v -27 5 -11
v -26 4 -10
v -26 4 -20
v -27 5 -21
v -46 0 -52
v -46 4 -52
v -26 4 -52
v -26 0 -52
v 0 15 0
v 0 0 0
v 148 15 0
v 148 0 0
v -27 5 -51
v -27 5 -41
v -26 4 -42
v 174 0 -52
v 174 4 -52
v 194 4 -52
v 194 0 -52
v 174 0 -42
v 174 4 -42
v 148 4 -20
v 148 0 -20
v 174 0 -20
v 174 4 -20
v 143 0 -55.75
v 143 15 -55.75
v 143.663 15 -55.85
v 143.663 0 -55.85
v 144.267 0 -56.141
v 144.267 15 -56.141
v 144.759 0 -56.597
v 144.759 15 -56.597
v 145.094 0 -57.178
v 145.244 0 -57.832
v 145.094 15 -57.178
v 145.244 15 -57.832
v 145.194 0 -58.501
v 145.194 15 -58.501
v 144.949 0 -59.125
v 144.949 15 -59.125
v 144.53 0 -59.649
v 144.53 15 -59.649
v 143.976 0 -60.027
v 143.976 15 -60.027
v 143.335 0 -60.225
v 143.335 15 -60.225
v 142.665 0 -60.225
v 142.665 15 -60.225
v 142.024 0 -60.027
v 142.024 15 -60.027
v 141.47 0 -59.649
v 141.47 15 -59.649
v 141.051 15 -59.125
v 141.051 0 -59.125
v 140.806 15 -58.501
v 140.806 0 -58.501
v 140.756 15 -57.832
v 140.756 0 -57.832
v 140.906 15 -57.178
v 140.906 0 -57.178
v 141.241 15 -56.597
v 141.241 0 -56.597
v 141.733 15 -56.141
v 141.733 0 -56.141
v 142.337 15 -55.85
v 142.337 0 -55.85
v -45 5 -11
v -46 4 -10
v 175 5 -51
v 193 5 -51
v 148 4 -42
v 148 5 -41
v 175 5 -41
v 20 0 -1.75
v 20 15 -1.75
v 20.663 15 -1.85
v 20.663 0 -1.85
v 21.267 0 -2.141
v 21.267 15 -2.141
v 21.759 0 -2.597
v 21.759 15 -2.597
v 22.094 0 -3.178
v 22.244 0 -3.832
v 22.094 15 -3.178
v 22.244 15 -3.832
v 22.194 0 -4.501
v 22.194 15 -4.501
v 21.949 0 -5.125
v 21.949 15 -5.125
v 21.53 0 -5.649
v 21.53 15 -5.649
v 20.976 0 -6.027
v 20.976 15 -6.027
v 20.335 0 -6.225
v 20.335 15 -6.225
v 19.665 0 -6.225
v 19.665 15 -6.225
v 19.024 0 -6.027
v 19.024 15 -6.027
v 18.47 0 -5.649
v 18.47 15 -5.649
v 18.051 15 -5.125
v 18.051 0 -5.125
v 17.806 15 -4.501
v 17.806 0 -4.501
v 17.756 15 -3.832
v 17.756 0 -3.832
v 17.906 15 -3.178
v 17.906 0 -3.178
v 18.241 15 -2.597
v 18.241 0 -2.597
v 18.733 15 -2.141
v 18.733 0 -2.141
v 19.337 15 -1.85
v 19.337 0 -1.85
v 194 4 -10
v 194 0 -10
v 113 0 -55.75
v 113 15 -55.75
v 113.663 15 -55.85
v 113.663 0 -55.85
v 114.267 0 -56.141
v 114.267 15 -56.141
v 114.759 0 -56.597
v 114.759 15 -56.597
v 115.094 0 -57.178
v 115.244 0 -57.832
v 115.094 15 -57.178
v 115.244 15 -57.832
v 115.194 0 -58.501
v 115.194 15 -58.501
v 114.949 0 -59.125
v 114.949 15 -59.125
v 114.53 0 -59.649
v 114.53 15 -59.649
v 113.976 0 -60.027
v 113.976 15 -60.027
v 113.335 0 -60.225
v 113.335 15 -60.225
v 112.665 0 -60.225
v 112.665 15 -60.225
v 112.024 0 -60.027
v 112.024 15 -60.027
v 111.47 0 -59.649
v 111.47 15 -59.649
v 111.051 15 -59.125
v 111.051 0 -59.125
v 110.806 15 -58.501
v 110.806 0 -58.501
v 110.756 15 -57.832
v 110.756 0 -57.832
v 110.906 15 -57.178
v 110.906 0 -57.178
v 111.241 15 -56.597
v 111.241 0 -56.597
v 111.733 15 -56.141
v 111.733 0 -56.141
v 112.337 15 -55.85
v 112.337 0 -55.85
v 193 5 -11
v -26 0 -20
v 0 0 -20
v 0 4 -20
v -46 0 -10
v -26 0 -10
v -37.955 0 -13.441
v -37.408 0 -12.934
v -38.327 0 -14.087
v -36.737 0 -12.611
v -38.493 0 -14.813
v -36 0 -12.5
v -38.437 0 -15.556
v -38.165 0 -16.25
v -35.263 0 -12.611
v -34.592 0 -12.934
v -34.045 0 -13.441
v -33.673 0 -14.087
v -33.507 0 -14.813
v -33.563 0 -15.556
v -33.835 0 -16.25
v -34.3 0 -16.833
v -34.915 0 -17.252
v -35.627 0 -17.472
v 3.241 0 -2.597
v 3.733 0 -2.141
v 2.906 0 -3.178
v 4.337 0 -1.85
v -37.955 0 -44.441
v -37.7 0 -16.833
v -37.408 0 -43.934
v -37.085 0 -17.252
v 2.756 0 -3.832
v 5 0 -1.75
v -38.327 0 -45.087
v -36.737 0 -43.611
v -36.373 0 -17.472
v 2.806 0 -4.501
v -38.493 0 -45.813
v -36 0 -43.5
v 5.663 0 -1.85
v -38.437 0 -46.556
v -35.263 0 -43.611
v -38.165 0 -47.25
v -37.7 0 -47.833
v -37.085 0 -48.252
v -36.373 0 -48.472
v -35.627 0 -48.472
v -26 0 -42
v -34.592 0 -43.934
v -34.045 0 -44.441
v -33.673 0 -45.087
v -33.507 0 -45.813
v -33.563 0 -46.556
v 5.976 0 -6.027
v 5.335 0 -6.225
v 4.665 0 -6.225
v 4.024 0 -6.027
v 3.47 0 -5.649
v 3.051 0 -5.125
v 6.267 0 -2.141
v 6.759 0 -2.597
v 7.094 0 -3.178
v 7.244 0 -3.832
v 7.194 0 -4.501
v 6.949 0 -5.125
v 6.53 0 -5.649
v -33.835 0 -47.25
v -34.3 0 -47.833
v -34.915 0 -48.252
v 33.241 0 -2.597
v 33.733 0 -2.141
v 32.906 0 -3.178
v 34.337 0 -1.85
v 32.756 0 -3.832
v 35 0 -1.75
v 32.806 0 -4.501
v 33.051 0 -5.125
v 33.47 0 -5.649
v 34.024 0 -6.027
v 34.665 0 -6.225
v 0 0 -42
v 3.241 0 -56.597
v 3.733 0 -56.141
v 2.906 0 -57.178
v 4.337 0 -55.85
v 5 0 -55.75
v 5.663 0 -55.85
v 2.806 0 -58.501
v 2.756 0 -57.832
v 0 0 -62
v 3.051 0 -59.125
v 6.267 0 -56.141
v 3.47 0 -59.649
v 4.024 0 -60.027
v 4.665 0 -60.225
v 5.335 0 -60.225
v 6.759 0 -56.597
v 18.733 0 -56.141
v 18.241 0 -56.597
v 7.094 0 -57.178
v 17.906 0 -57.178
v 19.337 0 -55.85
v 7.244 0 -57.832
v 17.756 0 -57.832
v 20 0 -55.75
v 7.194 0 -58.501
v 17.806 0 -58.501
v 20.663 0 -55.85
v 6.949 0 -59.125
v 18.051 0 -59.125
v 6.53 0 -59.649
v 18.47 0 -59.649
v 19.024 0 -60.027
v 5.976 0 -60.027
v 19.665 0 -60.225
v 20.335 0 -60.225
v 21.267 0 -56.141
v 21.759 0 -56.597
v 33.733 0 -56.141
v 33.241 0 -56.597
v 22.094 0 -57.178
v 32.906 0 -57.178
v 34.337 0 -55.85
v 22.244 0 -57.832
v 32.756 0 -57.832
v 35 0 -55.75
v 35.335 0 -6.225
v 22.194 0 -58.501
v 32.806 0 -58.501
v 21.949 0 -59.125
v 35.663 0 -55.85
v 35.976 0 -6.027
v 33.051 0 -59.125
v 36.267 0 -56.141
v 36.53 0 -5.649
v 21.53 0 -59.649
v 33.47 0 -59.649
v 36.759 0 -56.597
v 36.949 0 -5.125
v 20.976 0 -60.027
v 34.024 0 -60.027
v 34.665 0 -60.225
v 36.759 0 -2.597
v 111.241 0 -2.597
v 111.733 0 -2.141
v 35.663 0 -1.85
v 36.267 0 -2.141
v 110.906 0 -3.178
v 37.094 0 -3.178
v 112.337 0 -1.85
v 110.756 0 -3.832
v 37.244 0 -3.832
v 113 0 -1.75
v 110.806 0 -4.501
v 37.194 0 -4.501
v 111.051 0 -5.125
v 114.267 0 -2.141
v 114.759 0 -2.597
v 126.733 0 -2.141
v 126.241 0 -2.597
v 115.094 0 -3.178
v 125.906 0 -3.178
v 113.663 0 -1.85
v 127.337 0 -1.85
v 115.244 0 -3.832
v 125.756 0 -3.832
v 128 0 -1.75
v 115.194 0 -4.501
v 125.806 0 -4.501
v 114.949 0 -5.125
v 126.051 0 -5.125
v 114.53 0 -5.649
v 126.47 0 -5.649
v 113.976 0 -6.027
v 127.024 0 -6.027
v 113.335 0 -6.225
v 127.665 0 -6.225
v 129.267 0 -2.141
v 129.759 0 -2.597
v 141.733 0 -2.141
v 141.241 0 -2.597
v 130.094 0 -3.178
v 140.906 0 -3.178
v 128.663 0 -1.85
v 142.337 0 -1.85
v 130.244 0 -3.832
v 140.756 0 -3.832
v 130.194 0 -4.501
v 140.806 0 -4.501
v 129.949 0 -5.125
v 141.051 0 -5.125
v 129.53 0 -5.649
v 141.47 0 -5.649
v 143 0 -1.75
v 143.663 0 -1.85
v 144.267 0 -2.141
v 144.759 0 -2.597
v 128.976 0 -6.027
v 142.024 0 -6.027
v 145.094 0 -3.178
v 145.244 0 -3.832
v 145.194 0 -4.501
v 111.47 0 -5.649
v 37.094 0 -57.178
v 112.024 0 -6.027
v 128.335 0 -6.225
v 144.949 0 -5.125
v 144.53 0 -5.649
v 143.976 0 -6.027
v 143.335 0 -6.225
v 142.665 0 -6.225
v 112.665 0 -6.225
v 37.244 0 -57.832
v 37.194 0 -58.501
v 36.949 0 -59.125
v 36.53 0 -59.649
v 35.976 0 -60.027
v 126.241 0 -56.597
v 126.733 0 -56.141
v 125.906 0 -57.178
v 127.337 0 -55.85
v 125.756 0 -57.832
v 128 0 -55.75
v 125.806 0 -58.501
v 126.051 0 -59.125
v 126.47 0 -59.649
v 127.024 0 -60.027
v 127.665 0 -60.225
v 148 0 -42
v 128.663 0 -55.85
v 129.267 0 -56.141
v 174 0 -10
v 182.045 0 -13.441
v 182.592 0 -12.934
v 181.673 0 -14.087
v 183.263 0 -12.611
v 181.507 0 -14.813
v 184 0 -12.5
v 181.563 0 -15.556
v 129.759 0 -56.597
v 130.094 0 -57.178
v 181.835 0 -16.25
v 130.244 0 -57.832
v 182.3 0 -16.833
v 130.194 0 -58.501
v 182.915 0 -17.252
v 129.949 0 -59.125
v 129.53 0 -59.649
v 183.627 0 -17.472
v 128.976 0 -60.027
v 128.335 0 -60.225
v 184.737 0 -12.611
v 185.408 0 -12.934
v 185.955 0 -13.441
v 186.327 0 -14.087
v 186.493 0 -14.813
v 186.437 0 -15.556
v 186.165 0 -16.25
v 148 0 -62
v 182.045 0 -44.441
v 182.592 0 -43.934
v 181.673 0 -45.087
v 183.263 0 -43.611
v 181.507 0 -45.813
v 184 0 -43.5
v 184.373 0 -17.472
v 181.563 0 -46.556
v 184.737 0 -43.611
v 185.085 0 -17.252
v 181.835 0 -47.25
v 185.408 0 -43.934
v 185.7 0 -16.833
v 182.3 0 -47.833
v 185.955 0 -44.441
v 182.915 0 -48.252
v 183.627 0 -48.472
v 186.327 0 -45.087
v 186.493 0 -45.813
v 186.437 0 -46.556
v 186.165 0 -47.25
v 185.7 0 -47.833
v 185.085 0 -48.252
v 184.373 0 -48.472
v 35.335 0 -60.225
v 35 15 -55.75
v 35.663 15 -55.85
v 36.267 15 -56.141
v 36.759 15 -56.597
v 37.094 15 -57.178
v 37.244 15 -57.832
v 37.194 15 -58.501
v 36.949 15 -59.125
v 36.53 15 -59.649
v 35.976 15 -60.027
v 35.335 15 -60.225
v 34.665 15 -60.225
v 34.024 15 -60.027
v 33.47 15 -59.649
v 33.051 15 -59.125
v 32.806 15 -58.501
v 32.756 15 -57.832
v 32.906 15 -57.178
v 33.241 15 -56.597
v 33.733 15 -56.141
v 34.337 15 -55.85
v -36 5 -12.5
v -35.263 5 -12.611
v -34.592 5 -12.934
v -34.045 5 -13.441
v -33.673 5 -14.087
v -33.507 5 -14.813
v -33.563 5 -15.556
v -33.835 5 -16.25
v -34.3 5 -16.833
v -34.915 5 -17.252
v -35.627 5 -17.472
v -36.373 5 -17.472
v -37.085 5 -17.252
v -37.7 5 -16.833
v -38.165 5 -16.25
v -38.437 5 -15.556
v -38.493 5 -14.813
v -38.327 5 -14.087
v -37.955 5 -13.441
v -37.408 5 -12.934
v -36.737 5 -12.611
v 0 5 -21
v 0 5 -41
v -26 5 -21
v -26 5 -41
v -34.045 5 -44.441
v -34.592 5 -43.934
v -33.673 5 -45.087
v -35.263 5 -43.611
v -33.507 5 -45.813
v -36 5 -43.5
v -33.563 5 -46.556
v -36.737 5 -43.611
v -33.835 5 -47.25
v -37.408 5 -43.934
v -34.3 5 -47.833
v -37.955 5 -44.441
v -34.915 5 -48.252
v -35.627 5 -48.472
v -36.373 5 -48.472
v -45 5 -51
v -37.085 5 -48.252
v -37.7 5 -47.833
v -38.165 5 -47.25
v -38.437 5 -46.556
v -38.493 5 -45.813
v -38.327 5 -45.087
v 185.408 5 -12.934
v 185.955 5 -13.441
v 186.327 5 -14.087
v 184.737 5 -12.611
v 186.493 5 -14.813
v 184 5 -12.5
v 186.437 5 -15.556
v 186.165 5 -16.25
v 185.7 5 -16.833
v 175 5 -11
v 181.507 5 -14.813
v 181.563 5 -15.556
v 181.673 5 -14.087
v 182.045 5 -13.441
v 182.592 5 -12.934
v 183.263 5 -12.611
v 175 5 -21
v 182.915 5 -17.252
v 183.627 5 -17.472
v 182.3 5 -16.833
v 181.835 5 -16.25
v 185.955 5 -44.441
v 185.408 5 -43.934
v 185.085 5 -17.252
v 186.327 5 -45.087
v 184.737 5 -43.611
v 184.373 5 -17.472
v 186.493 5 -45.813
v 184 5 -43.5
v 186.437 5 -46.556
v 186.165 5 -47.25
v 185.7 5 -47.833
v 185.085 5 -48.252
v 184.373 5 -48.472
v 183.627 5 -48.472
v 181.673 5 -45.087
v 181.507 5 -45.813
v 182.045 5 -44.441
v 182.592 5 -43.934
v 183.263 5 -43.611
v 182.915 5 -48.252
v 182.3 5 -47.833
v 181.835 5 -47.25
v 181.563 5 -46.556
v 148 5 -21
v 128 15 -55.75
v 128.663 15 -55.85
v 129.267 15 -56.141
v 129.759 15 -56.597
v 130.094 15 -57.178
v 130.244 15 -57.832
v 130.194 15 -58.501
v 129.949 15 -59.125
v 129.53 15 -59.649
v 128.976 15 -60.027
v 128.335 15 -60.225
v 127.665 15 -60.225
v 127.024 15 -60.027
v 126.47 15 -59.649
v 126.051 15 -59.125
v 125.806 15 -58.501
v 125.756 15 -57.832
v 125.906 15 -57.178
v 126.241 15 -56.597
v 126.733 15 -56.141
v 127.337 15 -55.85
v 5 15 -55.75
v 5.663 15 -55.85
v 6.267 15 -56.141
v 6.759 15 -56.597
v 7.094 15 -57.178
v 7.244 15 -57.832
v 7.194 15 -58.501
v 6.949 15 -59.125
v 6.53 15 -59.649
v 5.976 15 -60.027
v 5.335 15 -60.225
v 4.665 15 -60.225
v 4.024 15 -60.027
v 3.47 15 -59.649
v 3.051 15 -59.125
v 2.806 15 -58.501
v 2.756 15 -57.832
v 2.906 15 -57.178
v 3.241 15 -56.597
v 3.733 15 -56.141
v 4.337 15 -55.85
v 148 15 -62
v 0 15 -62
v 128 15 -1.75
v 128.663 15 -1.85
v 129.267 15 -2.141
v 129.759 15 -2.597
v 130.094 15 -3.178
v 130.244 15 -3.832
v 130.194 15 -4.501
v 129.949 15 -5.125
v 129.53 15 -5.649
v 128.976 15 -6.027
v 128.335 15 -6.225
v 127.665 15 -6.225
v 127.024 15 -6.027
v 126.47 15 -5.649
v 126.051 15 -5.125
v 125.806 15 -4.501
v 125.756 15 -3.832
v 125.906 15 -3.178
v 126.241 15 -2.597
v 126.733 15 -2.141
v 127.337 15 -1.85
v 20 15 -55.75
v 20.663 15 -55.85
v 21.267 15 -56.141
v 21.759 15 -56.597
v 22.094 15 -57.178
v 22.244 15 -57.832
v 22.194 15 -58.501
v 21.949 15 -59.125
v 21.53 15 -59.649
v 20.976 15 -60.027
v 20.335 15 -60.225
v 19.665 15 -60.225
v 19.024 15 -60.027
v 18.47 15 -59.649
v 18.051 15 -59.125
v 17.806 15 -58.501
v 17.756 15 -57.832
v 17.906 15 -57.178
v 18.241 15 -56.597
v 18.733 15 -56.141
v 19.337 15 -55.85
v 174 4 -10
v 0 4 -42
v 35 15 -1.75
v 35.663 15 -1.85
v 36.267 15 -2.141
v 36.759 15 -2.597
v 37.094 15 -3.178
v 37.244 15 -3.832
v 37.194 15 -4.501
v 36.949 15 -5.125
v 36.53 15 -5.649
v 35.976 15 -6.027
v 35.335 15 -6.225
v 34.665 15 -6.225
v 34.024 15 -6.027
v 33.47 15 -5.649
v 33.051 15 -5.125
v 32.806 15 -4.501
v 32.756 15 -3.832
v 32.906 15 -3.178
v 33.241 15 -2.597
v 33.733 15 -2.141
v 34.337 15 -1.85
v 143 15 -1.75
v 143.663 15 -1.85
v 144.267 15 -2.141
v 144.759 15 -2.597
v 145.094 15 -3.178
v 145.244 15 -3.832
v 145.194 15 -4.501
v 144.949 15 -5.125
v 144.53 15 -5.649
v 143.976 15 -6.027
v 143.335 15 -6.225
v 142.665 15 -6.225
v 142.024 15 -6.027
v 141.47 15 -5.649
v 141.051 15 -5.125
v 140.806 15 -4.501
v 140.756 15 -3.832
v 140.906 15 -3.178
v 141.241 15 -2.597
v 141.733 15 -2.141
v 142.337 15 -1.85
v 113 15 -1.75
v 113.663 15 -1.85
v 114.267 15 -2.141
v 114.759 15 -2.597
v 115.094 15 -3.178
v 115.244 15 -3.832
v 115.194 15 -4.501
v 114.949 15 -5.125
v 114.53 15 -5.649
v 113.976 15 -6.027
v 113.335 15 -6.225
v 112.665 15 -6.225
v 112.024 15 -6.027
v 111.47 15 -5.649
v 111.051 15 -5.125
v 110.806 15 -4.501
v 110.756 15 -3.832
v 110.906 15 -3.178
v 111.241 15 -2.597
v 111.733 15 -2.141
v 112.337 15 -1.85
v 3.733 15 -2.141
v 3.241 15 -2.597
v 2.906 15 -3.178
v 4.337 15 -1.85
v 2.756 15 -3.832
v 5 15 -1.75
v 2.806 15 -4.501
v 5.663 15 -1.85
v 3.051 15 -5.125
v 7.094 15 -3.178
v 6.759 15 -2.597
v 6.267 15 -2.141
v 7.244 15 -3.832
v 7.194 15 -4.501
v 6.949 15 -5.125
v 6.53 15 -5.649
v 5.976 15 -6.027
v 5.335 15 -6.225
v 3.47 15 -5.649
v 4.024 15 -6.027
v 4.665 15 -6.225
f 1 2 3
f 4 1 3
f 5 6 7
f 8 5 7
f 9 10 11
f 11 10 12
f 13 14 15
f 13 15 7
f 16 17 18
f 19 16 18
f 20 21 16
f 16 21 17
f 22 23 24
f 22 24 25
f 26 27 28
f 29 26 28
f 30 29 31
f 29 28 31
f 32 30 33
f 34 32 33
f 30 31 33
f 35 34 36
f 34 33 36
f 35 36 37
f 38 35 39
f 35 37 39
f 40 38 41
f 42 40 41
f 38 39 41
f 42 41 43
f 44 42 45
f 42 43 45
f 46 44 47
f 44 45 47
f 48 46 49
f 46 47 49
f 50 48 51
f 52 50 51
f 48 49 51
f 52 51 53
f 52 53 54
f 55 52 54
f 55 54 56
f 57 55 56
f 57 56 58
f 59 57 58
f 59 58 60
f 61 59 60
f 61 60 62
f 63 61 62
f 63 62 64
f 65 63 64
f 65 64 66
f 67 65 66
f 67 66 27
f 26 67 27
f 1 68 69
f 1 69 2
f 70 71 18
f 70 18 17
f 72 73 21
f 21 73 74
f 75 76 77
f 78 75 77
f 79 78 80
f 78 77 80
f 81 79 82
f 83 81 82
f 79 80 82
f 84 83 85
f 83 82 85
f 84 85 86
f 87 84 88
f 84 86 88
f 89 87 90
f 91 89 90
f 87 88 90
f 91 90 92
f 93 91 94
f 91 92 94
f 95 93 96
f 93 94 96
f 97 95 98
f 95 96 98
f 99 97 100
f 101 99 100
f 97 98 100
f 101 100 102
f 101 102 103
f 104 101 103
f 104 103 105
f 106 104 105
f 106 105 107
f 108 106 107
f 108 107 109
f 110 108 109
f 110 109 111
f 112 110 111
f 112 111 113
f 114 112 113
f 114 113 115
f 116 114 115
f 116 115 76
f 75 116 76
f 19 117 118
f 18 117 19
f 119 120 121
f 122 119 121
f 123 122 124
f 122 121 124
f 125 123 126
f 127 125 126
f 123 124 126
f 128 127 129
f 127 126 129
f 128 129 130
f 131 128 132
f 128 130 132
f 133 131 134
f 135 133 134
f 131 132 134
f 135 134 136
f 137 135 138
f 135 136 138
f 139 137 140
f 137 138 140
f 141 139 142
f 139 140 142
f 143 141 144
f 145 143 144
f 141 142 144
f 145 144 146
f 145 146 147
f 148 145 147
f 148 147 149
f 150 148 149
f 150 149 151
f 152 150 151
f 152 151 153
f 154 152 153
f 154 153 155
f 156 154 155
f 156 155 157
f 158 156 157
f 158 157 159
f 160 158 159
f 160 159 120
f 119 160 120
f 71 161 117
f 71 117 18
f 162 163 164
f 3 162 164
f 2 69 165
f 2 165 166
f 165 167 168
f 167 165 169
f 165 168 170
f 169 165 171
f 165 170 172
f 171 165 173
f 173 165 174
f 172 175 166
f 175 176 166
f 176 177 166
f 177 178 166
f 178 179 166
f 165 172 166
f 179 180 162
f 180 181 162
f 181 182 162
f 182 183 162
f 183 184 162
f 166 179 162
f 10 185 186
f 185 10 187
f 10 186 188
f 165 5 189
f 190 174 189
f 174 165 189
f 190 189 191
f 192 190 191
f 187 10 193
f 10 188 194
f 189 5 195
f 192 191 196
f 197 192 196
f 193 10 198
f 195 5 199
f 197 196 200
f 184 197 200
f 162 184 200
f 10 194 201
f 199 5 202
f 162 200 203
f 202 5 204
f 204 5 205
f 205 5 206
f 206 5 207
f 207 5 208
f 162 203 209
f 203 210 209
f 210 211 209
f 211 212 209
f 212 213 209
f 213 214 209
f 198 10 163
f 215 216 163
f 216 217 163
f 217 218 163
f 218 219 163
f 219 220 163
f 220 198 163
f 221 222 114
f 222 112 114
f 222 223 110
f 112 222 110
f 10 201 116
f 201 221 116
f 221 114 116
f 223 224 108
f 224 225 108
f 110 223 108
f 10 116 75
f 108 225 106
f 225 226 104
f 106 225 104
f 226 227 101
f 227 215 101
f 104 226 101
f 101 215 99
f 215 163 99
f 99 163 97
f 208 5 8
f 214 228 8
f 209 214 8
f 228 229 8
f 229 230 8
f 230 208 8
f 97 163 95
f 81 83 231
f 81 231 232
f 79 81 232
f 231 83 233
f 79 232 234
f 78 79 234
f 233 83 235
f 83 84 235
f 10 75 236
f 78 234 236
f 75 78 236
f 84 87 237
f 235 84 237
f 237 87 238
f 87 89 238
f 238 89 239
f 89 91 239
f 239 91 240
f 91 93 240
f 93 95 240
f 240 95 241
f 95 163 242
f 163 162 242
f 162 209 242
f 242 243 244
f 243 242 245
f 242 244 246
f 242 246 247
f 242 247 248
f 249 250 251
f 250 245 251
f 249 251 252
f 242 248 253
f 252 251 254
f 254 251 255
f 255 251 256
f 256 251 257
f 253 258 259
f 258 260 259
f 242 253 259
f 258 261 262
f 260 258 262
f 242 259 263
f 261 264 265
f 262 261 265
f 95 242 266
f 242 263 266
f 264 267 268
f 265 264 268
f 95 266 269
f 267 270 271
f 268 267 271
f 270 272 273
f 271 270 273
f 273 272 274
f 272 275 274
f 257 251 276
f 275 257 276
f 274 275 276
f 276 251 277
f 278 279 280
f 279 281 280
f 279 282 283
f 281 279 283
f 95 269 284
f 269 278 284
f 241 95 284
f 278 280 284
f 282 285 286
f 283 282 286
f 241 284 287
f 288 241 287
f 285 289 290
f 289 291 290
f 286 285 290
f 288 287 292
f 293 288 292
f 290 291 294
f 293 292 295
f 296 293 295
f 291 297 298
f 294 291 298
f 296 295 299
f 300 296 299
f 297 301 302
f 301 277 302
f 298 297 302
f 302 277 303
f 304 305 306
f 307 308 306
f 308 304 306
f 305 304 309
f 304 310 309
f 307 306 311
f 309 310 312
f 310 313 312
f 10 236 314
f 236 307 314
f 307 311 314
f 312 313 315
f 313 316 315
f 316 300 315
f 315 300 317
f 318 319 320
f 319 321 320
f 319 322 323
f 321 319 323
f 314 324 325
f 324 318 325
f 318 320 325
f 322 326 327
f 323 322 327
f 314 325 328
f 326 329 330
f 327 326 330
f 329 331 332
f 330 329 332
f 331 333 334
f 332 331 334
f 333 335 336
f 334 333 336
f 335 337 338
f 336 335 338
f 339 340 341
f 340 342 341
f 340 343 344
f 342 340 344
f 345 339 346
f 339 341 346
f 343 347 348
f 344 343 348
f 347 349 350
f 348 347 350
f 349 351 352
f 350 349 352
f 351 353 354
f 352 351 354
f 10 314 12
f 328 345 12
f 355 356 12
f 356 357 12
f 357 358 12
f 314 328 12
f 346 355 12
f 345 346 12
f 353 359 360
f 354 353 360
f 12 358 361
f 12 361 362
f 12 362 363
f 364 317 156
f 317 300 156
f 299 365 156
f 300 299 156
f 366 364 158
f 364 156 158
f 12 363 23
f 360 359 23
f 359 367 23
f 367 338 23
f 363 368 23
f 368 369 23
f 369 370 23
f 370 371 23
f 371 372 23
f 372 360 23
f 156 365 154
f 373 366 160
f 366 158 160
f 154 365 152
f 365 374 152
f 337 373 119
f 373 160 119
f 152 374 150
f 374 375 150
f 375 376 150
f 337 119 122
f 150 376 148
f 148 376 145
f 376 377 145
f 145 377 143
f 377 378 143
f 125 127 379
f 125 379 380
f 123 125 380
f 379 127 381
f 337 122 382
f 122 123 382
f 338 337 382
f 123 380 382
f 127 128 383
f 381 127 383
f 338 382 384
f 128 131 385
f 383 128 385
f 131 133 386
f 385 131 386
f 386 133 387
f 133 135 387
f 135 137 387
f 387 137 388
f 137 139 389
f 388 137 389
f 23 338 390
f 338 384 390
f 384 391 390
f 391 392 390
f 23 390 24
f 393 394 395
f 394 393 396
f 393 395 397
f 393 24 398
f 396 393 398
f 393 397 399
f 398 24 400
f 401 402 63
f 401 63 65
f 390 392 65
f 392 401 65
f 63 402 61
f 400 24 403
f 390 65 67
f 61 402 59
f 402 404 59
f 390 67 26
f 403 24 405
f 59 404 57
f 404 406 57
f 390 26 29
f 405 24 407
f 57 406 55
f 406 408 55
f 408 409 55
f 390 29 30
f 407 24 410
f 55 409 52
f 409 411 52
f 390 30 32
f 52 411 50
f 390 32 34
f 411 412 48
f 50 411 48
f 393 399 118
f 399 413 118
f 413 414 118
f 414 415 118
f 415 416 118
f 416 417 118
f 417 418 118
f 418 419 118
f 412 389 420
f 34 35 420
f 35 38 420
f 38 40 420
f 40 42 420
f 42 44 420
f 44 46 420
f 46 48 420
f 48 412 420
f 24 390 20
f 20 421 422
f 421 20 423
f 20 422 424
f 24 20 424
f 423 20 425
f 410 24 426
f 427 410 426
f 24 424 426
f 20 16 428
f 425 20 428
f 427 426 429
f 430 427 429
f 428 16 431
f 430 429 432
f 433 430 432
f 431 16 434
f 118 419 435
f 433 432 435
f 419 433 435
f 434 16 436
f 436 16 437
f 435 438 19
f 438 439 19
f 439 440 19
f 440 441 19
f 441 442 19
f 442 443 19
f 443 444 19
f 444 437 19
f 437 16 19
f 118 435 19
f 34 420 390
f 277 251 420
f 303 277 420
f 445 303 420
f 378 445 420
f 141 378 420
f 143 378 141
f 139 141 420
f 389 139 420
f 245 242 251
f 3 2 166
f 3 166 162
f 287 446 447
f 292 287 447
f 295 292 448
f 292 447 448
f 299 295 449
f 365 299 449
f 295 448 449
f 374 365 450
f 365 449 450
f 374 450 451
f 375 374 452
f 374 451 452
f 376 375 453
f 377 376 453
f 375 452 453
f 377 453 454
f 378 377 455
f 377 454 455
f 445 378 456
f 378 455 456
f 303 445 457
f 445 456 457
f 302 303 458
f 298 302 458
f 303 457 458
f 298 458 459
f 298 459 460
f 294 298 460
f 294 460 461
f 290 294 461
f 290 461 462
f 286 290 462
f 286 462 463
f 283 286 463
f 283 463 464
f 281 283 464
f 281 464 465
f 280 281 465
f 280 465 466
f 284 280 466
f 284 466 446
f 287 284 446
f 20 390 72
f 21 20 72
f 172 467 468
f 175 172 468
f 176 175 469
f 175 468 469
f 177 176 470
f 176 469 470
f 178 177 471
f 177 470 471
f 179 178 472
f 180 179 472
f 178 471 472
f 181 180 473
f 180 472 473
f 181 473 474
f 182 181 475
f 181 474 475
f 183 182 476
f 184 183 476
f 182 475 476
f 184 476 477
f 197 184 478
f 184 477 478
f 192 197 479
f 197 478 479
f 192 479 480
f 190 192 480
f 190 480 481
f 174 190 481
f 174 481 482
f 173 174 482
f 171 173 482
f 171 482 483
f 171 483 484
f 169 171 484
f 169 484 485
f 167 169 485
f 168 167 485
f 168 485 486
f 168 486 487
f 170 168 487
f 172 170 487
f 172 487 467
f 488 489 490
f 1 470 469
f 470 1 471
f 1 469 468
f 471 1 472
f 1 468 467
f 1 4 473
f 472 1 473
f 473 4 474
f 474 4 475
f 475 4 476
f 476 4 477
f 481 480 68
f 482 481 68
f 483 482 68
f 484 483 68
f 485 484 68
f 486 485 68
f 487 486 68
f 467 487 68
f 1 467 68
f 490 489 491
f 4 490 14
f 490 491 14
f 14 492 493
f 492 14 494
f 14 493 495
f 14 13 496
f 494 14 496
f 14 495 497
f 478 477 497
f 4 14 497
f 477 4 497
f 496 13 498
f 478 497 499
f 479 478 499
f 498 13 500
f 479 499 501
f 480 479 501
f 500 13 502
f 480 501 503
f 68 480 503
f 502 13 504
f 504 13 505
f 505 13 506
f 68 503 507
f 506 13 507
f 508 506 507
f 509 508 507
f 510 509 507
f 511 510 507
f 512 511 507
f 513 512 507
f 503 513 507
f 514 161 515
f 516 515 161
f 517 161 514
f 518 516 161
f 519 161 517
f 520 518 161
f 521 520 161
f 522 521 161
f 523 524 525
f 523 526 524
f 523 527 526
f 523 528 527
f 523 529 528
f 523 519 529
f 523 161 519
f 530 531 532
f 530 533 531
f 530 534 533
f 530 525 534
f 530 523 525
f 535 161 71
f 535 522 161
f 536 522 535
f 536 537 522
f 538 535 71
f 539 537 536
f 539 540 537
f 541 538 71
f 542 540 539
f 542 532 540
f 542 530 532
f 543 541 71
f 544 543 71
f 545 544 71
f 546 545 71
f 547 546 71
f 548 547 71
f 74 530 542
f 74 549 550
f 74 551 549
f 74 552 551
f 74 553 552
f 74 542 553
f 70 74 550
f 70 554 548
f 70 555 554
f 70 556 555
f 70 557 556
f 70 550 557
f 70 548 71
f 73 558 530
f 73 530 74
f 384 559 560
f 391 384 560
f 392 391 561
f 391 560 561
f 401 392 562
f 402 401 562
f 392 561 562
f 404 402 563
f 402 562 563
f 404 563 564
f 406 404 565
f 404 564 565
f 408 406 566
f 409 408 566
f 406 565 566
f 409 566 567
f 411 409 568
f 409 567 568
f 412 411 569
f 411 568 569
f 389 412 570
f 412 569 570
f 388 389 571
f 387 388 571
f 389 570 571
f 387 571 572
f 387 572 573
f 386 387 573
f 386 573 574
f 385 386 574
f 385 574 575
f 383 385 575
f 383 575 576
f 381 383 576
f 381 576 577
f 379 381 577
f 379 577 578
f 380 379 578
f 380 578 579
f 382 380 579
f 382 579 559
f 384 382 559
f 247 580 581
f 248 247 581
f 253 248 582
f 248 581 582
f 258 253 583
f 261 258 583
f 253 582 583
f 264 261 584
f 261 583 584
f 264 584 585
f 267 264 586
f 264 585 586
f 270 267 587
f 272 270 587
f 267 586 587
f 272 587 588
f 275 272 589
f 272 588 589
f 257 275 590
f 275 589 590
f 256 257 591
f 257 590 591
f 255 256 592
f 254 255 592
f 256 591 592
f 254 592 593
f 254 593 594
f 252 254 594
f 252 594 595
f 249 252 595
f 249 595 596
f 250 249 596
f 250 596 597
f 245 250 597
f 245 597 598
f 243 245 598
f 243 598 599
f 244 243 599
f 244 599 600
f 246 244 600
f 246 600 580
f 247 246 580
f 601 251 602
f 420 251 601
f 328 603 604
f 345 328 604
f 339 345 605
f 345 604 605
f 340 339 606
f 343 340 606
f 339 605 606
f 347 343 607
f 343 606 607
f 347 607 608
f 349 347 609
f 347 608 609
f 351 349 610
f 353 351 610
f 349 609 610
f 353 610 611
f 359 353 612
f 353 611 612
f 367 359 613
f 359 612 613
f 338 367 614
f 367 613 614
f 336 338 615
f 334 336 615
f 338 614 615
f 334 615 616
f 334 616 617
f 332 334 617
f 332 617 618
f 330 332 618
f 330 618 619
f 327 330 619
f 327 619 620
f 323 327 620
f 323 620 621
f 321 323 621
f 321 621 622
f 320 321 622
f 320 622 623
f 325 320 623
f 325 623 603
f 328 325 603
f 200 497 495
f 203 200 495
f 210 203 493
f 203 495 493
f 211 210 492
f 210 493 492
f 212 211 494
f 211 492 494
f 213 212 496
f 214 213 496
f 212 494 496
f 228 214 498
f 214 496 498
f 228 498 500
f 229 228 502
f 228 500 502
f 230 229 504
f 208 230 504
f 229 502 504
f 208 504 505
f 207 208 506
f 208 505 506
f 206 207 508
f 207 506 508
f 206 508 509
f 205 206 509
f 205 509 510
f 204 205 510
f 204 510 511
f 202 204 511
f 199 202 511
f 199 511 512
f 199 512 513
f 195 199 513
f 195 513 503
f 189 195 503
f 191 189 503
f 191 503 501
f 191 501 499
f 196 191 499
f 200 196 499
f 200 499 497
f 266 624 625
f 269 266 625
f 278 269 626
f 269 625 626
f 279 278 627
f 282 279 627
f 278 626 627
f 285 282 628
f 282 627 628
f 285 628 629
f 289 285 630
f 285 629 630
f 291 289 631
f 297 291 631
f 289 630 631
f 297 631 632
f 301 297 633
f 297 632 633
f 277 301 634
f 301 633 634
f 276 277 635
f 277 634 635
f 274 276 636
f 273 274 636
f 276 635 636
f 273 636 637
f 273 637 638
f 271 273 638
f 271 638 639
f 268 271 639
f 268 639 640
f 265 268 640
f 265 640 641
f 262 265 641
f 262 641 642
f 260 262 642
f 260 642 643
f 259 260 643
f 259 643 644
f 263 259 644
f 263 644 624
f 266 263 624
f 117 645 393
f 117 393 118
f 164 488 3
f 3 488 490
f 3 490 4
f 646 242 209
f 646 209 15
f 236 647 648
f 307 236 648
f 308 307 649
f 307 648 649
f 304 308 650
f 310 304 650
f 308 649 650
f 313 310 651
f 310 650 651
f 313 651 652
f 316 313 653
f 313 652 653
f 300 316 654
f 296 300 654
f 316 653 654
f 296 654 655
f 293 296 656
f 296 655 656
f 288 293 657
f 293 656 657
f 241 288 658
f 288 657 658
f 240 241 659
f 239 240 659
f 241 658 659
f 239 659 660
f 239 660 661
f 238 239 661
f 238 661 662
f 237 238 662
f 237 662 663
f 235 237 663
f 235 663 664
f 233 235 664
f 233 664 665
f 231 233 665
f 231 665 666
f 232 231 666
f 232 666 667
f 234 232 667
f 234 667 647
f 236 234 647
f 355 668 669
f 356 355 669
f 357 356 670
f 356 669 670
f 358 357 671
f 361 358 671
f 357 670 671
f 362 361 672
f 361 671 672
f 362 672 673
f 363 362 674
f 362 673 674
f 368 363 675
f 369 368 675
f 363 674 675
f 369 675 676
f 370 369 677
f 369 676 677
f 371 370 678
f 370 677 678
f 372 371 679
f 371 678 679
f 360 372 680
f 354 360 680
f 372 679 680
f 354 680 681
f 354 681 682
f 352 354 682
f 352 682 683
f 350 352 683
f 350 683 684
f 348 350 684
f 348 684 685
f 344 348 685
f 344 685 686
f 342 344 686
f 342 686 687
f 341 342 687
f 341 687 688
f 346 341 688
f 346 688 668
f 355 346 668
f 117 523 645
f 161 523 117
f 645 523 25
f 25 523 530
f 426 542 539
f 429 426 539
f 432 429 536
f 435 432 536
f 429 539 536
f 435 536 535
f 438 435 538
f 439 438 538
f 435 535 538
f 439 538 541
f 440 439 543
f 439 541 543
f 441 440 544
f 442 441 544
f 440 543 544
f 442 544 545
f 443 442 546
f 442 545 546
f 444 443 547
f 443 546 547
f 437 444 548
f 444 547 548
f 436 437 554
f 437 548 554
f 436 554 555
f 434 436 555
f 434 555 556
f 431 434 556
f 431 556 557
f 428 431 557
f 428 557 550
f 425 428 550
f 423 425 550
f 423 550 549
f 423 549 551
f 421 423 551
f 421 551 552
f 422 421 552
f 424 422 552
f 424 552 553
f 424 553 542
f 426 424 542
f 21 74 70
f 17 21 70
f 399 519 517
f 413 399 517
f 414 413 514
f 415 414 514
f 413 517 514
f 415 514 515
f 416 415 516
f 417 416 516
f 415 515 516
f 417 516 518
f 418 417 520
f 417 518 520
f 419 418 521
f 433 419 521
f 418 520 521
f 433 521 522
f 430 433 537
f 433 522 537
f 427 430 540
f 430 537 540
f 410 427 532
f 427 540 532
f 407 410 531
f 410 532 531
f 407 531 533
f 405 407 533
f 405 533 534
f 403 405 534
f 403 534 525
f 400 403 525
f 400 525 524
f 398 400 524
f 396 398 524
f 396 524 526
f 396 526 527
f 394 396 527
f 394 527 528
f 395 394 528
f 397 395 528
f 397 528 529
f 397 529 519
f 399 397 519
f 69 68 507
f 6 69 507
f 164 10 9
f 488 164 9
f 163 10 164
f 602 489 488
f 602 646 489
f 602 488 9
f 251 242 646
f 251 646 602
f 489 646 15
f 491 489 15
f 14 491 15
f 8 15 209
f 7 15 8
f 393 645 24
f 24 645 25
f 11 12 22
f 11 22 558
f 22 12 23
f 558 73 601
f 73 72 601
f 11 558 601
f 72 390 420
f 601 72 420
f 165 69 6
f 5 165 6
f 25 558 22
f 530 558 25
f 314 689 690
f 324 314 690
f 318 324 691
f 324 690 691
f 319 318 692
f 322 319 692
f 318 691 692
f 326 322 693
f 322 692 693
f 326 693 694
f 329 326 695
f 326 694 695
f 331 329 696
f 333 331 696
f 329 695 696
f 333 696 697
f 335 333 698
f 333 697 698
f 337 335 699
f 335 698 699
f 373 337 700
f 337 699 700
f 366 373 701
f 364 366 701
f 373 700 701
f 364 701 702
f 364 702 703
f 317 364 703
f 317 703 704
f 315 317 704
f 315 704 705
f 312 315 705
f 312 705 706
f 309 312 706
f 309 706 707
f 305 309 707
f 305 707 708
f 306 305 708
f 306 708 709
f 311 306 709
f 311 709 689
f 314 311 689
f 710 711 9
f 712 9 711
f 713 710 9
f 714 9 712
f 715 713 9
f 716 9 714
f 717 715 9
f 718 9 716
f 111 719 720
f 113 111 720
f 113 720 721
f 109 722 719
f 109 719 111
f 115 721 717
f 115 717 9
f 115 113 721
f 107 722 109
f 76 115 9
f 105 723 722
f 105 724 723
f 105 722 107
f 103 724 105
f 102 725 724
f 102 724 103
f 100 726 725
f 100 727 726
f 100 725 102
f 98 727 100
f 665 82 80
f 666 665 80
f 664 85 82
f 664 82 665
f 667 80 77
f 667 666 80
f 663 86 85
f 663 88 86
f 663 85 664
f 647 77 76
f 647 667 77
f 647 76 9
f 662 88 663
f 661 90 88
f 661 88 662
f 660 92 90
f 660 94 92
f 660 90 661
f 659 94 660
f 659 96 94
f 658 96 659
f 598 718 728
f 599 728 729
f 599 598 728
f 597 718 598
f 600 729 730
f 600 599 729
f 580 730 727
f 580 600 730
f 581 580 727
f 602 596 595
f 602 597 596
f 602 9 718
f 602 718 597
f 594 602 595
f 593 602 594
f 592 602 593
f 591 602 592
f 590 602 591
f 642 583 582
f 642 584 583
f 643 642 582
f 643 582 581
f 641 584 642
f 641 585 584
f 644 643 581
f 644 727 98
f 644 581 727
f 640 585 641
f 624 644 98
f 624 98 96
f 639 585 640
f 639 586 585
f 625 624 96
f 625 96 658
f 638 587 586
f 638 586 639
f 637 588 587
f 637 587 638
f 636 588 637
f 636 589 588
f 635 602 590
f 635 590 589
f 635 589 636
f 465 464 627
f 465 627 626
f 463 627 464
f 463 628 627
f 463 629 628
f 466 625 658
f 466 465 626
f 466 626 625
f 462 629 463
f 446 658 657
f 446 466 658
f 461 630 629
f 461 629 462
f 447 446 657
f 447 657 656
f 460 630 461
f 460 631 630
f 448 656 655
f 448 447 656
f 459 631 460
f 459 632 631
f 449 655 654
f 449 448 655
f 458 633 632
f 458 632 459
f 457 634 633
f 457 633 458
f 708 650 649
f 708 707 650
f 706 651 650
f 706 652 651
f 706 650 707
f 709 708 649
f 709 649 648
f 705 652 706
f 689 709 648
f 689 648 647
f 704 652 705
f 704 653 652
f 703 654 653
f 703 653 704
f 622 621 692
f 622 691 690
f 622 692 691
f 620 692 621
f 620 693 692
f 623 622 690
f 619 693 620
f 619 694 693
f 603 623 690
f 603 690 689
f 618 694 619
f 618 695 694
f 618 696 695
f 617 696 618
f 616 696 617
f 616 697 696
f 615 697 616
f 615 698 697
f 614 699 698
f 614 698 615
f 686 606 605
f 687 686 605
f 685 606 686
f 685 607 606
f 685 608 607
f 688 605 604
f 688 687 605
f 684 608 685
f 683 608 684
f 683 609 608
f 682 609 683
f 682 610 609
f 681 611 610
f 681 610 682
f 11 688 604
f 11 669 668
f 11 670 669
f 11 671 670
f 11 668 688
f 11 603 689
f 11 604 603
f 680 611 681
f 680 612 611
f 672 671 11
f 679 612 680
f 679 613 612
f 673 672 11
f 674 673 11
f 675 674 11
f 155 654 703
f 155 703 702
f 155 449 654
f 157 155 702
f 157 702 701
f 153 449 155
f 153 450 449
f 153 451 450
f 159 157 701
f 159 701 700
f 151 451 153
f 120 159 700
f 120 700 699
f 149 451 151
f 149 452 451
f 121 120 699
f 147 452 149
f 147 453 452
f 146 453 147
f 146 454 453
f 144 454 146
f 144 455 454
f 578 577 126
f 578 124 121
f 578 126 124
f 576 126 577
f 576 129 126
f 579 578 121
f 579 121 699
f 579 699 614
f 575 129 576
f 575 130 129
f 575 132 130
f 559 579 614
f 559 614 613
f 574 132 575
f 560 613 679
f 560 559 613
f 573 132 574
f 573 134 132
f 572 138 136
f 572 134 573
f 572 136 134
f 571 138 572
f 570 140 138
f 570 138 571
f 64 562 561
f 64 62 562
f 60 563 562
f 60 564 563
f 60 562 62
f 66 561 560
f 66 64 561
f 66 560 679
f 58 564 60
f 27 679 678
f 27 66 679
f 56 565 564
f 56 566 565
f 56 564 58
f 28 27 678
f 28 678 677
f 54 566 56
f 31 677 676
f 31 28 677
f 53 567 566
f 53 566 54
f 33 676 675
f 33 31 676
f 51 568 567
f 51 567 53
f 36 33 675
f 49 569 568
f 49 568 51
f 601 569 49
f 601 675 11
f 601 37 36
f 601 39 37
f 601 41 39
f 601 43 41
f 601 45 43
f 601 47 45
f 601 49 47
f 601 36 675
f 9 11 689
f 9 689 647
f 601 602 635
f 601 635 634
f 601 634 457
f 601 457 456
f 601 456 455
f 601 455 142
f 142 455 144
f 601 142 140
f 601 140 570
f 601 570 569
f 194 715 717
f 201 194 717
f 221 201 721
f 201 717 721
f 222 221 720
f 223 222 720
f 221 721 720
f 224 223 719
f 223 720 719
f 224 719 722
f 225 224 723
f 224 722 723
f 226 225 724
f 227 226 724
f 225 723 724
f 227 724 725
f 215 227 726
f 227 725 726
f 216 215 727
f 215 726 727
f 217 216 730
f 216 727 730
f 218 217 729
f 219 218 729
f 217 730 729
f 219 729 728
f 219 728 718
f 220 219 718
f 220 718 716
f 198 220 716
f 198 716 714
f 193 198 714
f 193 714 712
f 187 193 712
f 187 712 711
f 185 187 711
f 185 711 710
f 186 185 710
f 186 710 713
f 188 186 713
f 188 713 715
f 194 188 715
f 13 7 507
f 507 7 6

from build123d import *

# Parameters (mm, degrees)
SKETCH1_W           = 148
SKETCH1_H           = 62
BOSS_EXTRUDE1_DEPTH = 15
SKETCH2_R           = 2.25
CUT_EXTRUDE1_DEPTH  = 35
SKETCH3_R           = 2.25
CUT_EXTRUDE2_DEPTH  = 25
SKETCH4_W           = 22
SKETCH4_H           = 5
BOSS_EXTRUDE2_DEPTH = 26
SKETCH5_W           = 22
SKETCH5_H           = 5
BOSS_EXTRUDE3_DEPTH = 26
SKETCH6_W           = 20
SKETCH6_H           = 42
BOSS_EXTRUDE4_DEPTH = 15
SKETCH7_W           = 20
SKETCH7_H           = 42
BOSS_EXTRUDE5_DEPTH = 15
SKETCH8_R           = 2.5
CUT_EXTRUDE3_DEPTH  = 25
SKETCH9_R           = 2.5
CUT_EXTRUDE4_DEPTH  = 25
CHAMFER3_SIZE       = 1
CHAMFER4_SIZE       = 1
CHAMFER5_SIZE       = 1
SKETCH10_W          = 27.530750263
SKETCH10_H          = 14.173658936
CUT_EXTRUDE5_DEPTH  = 60
SKETCH11_W          = 32.495188708
SKETCH11_H          = 15.919959855
CUT_EXTRUDE6_DEPTH  = 60
CHAMFER6_SIZE       = 1
CHAMFER7_SIZE       = 1


with BuildPart() as part:
    # Sketch1 → Boss-Extrude1 (new body)
    with BuildSketch(Plane(origin=(0, 0, 0), x_dir=(1, 0, 0), z_dir=(0, 1, 0))):
        with Locations((74, 31)):
            Rectangle(SKETCH1_W, SKETCH1_H)
    extrude(amount=BOSS_EXTRUDE1_DEPTH)

    # Sketch2 → Cut-Extrude1 (cut)
    with BuildSketch(Plane(origin=(0, 15, 0), x_dir=(1, 0, 0), z_dir=(0, 1, 0))):
        with Locations(Location((5, 4, 0), (0, 0, 270))):
            Circle(SKETCH2_R)
        with Locations(Location((20, 4, 0), (0, 0, 270))):
            Circle(SKETCH2_R)
        with Locations(Location((35, 4, 0), (0, 0, 270))):
            Circle(SKETCH2_R)
        with Locations(Location((5, 58, 0), (0, 0, 270))):
            Circle(SKETCH2_R)
        with Locations(Location((20, 58, 0), (0, 0, 270))):
            Circle(SKETCH2_R)
        with Locations(Location((35, 58, 0), (0, 0, 270))):
            Circle(SKETCH2_R)
    extrude(amount=-CUT_EXTRUDE1_DEPTH, mode=Mode.SUBTRACT)

    # Sketch3 → Cut-Extrude2 (cut)
    with BuildSketch(Plane(origin=(0, 15, 0), x_dir=(1, 0, 0), z_dir=(0, 1, 0))):
        with Locations(Location((143, 58, 0), (0, 0, 270))):
            Circle(SKETCH3_R)
        with Locations(Location((143, 4, 0), (0, 0, 270))):
            Circle(SKETCH3_R)
        with Locations(Location((128, 58, 0), (0, 0, 270))):
            Circle(SKETCH3_R)
        with Locations(Location((113, 58, 0), (0, 0, 270))):
            Circle(SKETCH3_R)
        with Locations(Location((128, 4, 0), (0, 0, 270))):
            Circle(SKETCH3_R)
        with Locations(Location((113, 4, 0), (0, 0, 270))):
            Circle(SKETCH3_R)
    extrude(amount=-CUT_EXTRUDE2_DEPTH, mode=Mode.SUBTRACT)

    # Sketch4 → Boss-Extrude2 (add)
    with BuildSketch(Plane(origin=(148, 0, 0), x_dir=(0, 0, -1), z_dir=(1, 0, 0))):
        with Locations((31, 2.5)):
            Rectangle(SKETCH4_W, SKETCH4_H)
    extrude(amount=BOSS_EXTRUDE2_DEPTH)

    # Sketch5 → Boss-Extrude3 (add)
    with BuildSketch(Plane.ZY):
        with Locations((-31, 2.5)):
            Rectangle(SKETCH5_W, SKETCH5_H)
    extrude(amount=BOSS_EXTRUDE3_DEPTH)

    # Sketch6 → Boss-Extrude4 (add)
    with BuildSketch(Plane(origin=(0, 15, 0), x_dir=(1, 0, 0), z_dir=(0, 1, 0))):
        with Locations((184, 31)):
            Rectangle(SKETCH6_W, SKETCH6_H)
    extrude(amount=-BOSS_EXTRUDE4_DEPTH)

    # Sketch7 → Boss-Extrude5 (add)
    with BuildSketch(Plane(origin=(0, 15, 0), x_dir=(1, 0, 0), z_dir=(0, 1, 0))):
        with Locations((-36, 31)):
            Rectangle(SKETCH7_W, SKETCH7_H)
    extrude(amount=-BOSS_EXTRUDE5_DEPTH)

    # Sketch8 → Cut-Extrude3 (cut)
    with BuildSketch(Plane(origin=(0, 15, 0), x_dir=(1, 0, 0), z_dir=(0, 1, 0))):
        with Locations(Location((-36, 46, 0), (0, 0, 270))):
            Circle(SKETCH8_R)
        with Locations(Location((-36, 15, 0), (0, 0, 270))):
            Circle(SKETCH8_R)
    extrude(amount=-CUT_EXTRUDE3_DEPTH, mode=Mode.SUBTRACT)

    # Sketch9 → Cut-Extrude4 (cut)
    with BuildSketch(Plane(origin=(0, 15, 0), x_dir=(1, 0, 0), z_dir=(0, 1, 0))):
        with Locations(Location((184, 46, 0), (0, 0, 270))):
            Circle(SKETCH9_R)
        with Locations(Location((184, 15, 0), (0, 0, 270))):
            Circle(SKETCH9_R)
    extrude(amount=-CUT_EXTRUDE4_DEPTH, mode=Mode.SUBTRACT)

    # Chamfer3
    chamfer3_edges = [part.edges().sort_by_distance(p)[0] for p in [
        (194, 15, -31),
        (-26, 15, -31),
        (-46, 15, -31),
        (161, 5, -20),
    ]]
    chamfer(chamfer3_edges, length=CHAMFER3_SIZE)

    # Chamfer4
    chamfer4_edges = [part.edges().sort_by_distance(p)[0] for p in [
        (-13, 5, -20),
        (-36, 15, -10),
        (-36, 15, -52),
        (183.5, 15, -10),
        (183.5, 15, -52),
        (161, 5, -42),
    ]]
    chamfer(chamfer4_edges, length=CHAMFER4_SIZE)

    # Chamfer5
    chamfer5_edges = [part.edges().sort_by_distance(p)[0] for p in [
        (-13, 5, -42),
        (174, 15, -31),
    ]]
    chamfer(chamfer5_edges, length=CHAMFER5_SIZE)

    # Sketch10 → Cut-Extrude5 (cut)
    with BuildSketch(Plane(origin=(0, 0, -52), x_dir=(-1, 0, 0), z_dir=(0, 0, -1))):
        with Locations((-183.765375132, 12.086829468)):
            Rectangle(SKETCH10_W, SKETCH10_H)
    extrude(amount=-CUT_EXTRUDE5_DEPTH, mode=Mode.SUBTRACT)

    # Sketch11 → Cut-Extrude6 (cut)
    with BuildSketch(Plane(origin=(0, 0, -52), x_dir=(-1, 0, 0), z_dir=(0, 0, -1))):
        with Locations((37.724079719, 12.959979928)):
            Rectangle(SKETCH11_W, SKETCH11_H)
    extrude(amount=-CUT_EXTRUDE6_DEPTH, mode=Mode.SUBTRACT)

    # Chamfer6
    chamfer6_edges = [part.edges().sort_by_distance(p)[0] for p in [
        (174, 5, -46.5),
        (194, 5, -31),
        (174, 5, -15.5),
        (-46, 5, -31),
        (-36, 5, -10),
        (-26, 5, -46.5),
    ]]
    chamfer(chamfer6_edges, length=CHAMFER6_SIZE)

    # Chamfer7
    chamfer7_edges = [part.edges().sort_by_distance(p)[0] for p in [
        (-36, 5, -52),
        (-26, 5, -16),
        (184, 5, -10),
        (184, 5, -52),
    ]]
    chamfer(chamfer7_edges, length=CHAMFER7_SIZE)


solid = part.part
